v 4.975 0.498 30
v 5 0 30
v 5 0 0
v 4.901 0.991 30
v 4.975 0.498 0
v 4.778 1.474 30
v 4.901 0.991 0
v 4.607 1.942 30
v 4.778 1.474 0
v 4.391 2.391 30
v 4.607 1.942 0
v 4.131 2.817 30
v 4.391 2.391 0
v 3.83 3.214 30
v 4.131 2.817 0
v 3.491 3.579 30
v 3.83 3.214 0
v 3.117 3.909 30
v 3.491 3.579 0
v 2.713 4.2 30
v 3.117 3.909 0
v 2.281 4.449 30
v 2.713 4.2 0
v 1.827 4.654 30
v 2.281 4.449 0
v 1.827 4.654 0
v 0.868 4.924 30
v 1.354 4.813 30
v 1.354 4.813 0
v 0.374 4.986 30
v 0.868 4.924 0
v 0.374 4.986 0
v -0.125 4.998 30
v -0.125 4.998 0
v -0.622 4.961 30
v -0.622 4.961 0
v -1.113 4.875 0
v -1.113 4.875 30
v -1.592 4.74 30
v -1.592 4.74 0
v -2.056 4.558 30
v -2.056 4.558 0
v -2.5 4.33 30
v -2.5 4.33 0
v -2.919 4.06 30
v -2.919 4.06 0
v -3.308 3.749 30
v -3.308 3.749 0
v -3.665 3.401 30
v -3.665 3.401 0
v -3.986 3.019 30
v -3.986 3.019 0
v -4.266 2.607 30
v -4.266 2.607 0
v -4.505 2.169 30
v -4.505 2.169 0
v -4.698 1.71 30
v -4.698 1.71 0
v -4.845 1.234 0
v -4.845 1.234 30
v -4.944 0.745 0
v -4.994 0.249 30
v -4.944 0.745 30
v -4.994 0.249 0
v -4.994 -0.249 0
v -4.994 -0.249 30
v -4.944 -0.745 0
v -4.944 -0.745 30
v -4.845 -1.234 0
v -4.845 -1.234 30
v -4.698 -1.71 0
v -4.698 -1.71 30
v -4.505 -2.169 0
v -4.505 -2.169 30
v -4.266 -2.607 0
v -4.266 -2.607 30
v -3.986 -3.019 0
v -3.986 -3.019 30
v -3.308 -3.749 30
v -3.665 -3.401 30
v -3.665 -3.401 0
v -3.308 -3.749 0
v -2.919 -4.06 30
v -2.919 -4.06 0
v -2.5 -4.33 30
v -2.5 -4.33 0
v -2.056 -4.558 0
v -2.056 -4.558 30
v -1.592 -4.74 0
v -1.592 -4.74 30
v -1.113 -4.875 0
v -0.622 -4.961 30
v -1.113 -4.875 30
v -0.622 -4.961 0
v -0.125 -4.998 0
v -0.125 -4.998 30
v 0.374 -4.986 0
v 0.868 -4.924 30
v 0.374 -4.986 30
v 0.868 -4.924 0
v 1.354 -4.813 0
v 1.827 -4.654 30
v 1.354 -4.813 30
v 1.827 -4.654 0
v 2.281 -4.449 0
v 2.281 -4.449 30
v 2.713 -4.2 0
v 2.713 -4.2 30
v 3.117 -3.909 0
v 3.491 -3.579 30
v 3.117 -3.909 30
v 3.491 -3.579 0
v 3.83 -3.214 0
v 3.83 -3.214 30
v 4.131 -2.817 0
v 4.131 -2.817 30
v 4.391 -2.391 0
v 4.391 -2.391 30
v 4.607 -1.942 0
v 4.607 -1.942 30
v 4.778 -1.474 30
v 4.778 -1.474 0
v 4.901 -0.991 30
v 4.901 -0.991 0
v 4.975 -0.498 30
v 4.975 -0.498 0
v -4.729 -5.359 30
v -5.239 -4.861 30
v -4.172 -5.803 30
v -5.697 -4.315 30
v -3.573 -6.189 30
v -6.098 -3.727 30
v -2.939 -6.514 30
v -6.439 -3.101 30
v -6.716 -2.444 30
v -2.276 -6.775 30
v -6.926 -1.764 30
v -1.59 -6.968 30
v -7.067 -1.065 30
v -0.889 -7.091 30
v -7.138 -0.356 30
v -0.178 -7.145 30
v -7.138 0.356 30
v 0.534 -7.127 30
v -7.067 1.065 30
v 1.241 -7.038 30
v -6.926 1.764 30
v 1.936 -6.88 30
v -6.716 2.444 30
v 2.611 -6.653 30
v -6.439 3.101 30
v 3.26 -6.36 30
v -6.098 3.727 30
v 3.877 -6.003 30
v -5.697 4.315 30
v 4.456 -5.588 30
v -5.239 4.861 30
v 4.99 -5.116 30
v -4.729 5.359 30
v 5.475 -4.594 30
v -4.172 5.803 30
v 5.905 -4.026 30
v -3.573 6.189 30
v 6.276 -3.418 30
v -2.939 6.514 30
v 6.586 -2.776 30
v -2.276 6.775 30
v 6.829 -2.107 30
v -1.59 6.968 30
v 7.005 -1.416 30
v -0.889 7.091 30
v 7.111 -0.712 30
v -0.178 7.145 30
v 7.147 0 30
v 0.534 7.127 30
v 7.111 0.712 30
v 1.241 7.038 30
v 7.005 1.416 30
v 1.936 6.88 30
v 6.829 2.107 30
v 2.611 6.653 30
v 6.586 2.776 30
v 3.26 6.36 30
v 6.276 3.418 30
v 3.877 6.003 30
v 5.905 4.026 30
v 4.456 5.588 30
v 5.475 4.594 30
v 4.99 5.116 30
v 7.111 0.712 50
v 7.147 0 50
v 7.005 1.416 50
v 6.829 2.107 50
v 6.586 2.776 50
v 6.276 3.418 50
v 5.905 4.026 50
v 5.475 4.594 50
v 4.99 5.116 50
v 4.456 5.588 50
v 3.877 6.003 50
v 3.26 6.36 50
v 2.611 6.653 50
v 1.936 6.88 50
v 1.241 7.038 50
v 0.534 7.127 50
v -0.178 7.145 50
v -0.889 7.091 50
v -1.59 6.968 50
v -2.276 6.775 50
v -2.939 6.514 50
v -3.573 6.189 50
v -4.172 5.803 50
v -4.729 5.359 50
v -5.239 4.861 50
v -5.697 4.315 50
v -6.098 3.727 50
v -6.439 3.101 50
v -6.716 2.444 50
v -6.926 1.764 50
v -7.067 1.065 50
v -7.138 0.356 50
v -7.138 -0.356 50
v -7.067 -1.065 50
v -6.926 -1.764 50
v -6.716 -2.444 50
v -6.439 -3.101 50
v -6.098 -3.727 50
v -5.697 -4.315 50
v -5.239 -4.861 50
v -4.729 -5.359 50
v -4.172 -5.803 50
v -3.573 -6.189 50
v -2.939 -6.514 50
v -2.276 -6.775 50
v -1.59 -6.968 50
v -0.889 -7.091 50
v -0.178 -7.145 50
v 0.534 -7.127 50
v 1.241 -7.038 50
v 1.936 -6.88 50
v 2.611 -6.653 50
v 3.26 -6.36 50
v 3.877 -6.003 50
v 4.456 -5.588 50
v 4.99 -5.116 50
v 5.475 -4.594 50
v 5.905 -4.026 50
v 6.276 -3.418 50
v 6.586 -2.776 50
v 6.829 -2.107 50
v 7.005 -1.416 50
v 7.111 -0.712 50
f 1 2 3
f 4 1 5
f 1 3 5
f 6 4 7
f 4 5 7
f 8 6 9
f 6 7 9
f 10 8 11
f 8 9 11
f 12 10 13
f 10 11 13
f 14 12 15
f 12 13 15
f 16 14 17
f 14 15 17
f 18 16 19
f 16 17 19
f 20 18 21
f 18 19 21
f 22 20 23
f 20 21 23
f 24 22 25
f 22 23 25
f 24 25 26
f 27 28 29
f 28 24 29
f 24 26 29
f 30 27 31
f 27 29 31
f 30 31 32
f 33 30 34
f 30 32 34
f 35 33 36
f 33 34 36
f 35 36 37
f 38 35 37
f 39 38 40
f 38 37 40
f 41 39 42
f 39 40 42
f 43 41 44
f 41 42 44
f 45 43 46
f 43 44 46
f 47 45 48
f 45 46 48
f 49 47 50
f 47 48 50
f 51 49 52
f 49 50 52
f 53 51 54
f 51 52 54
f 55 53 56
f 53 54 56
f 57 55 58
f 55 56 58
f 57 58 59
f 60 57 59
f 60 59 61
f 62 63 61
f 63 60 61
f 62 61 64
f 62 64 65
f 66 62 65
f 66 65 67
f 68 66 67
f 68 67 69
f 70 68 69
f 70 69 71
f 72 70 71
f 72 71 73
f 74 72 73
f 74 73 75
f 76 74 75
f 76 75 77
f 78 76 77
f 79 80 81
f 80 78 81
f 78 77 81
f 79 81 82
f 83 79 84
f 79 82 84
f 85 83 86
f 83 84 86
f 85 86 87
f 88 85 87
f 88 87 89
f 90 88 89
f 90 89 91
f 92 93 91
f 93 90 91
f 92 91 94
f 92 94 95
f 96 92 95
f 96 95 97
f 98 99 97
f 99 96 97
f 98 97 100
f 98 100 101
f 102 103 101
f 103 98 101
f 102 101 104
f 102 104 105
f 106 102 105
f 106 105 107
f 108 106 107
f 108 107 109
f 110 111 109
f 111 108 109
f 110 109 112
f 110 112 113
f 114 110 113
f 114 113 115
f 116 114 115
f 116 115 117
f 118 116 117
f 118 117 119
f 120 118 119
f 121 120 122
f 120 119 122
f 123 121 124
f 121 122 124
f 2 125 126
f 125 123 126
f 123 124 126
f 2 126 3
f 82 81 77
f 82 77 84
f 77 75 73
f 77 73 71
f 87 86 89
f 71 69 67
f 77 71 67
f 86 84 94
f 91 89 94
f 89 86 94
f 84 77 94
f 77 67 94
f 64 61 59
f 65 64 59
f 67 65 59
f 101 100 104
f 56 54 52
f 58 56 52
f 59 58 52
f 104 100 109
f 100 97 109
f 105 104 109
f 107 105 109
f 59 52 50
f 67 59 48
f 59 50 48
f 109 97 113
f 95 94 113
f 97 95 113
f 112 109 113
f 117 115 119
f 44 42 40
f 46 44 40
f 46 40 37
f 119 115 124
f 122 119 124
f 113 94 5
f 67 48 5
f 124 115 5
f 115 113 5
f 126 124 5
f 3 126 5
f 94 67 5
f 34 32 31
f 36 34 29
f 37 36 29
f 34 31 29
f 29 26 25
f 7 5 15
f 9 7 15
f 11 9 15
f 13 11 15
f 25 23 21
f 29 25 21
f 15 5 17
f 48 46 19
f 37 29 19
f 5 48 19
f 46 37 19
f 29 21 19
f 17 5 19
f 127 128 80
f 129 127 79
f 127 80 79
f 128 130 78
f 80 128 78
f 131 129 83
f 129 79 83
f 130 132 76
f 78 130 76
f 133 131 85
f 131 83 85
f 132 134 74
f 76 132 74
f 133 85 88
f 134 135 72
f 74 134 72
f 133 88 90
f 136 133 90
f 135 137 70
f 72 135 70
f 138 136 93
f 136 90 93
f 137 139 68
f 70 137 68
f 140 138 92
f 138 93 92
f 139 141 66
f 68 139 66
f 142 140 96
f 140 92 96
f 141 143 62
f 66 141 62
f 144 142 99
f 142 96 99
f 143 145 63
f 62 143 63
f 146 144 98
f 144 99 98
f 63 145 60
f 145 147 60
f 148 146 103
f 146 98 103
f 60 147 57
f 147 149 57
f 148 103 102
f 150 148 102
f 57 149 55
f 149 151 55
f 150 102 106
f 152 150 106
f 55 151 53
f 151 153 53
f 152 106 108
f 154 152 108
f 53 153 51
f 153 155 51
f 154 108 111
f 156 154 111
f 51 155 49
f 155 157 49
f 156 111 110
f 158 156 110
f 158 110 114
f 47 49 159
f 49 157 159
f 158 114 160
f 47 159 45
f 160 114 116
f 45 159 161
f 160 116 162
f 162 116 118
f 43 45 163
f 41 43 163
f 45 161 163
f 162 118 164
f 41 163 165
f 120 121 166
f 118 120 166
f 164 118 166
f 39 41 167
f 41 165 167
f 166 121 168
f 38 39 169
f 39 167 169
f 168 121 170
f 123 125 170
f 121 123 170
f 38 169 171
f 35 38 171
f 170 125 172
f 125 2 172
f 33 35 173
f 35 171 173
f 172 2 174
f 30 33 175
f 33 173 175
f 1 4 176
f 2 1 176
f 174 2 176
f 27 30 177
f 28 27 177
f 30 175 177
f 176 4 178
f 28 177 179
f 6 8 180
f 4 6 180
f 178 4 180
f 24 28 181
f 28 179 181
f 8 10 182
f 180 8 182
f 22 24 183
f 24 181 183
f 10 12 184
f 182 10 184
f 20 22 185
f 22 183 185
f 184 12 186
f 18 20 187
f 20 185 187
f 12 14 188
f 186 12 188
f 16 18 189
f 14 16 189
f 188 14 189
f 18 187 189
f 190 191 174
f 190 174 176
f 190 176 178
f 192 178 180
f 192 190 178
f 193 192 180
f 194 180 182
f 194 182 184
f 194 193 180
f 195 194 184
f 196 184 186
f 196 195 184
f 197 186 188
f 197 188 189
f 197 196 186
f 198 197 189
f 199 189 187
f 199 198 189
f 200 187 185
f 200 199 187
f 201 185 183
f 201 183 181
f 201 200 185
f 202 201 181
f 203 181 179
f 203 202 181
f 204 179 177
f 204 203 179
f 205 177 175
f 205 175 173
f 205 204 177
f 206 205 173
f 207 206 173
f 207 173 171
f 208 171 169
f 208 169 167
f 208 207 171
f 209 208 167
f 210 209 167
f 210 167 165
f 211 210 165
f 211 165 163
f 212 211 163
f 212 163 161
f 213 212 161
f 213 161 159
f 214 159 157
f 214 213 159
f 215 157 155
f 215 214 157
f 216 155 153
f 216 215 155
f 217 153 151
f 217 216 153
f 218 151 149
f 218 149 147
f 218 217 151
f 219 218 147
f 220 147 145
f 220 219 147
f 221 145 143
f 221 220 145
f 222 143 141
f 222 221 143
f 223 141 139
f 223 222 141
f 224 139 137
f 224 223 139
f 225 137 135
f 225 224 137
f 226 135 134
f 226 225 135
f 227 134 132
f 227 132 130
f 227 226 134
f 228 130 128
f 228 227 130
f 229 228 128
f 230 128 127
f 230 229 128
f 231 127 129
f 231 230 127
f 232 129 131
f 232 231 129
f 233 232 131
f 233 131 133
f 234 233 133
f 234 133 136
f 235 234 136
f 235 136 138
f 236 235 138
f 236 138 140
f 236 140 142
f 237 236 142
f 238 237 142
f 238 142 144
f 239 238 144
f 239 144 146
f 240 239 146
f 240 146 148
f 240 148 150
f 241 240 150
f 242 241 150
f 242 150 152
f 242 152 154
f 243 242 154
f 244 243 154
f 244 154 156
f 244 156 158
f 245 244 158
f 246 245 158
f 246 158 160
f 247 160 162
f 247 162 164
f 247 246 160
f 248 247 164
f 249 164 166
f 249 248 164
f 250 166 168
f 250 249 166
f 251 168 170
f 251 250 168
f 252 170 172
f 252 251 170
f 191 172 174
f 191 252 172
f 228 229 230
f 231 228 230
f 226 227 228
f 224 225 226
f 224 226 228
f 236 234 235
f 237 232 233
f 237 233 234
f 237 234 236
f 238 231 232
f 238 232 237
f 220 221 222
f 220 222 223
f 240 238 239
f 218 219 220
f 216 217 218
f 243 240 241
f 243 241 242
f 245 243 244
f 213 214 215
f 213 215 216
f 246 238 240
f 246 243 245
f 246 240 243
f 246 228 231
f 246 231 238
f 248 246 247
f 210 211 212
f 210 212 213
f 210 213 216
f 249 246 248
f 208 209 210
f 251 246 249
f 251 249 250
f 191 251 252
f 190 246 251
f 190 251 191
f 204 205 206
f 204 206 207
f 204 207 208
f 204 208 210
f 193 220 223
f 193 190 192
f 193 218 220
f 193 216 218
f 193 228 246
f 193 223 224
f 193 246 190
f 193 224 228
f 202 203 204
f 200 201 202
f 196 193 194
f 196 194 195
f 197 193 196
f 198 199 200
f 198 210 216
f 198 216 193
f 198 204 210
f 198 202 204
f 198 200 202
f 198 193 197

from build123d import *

# Parameters (mm, degrees)
SKETCH_2_R      = 5
EXTRUDE_1_DEPTH = 50
THREAD_1_PITCH  = 1
THREAD_1_HEIGHT = 10
THREAD_1_RADIUS = 5
SKETCH_8_R      = 7.146780715
EXTRUDE_2_DEPTH = 20


with BuildPart() as part:
    # Sketch 2 → Бобышка-Вытянуть1 (new body)
    with BuildSketch(Plane.XY):
        Circle(SKETCH_2_R)
    extrude(amount=EXTRUDE_1_DEPTH)

    # Резьба1: sweep along a helix
    with BuildLine() as thread_1_path:
        Helix(THREAD_1_PITCH, THREAD_1_HEIGHT, THREAD_1_RADIUS, center=(0, 0, 50), direction=(0, 0, -1))
    # Sketch 2 2 → Резьба1 (sweep, cut)
    with BuildSketch(Plane(origin=(-5, 0, 50), x_dir=(-1, 0, 0), z_dir=(0, -1, 0))):
        Polygon((0, 0), (0, 0.874999997), (-0.541265875, 0.562499999), (-0.541265875, 0.312499999), align=None)
    sweep(path=thread_1_path.line, is_frenet=True, mode=Mode.SUBTRACT)

    # Эскиз8 → Бобышка-Вытянуть2 (add)
    with BuildSketch(Plane.XY.offset(50)):
        Circle(SKETCH_8_R)
    extrude(amount=-EXTRUDE_2_DEPTH)


solid = part.part
